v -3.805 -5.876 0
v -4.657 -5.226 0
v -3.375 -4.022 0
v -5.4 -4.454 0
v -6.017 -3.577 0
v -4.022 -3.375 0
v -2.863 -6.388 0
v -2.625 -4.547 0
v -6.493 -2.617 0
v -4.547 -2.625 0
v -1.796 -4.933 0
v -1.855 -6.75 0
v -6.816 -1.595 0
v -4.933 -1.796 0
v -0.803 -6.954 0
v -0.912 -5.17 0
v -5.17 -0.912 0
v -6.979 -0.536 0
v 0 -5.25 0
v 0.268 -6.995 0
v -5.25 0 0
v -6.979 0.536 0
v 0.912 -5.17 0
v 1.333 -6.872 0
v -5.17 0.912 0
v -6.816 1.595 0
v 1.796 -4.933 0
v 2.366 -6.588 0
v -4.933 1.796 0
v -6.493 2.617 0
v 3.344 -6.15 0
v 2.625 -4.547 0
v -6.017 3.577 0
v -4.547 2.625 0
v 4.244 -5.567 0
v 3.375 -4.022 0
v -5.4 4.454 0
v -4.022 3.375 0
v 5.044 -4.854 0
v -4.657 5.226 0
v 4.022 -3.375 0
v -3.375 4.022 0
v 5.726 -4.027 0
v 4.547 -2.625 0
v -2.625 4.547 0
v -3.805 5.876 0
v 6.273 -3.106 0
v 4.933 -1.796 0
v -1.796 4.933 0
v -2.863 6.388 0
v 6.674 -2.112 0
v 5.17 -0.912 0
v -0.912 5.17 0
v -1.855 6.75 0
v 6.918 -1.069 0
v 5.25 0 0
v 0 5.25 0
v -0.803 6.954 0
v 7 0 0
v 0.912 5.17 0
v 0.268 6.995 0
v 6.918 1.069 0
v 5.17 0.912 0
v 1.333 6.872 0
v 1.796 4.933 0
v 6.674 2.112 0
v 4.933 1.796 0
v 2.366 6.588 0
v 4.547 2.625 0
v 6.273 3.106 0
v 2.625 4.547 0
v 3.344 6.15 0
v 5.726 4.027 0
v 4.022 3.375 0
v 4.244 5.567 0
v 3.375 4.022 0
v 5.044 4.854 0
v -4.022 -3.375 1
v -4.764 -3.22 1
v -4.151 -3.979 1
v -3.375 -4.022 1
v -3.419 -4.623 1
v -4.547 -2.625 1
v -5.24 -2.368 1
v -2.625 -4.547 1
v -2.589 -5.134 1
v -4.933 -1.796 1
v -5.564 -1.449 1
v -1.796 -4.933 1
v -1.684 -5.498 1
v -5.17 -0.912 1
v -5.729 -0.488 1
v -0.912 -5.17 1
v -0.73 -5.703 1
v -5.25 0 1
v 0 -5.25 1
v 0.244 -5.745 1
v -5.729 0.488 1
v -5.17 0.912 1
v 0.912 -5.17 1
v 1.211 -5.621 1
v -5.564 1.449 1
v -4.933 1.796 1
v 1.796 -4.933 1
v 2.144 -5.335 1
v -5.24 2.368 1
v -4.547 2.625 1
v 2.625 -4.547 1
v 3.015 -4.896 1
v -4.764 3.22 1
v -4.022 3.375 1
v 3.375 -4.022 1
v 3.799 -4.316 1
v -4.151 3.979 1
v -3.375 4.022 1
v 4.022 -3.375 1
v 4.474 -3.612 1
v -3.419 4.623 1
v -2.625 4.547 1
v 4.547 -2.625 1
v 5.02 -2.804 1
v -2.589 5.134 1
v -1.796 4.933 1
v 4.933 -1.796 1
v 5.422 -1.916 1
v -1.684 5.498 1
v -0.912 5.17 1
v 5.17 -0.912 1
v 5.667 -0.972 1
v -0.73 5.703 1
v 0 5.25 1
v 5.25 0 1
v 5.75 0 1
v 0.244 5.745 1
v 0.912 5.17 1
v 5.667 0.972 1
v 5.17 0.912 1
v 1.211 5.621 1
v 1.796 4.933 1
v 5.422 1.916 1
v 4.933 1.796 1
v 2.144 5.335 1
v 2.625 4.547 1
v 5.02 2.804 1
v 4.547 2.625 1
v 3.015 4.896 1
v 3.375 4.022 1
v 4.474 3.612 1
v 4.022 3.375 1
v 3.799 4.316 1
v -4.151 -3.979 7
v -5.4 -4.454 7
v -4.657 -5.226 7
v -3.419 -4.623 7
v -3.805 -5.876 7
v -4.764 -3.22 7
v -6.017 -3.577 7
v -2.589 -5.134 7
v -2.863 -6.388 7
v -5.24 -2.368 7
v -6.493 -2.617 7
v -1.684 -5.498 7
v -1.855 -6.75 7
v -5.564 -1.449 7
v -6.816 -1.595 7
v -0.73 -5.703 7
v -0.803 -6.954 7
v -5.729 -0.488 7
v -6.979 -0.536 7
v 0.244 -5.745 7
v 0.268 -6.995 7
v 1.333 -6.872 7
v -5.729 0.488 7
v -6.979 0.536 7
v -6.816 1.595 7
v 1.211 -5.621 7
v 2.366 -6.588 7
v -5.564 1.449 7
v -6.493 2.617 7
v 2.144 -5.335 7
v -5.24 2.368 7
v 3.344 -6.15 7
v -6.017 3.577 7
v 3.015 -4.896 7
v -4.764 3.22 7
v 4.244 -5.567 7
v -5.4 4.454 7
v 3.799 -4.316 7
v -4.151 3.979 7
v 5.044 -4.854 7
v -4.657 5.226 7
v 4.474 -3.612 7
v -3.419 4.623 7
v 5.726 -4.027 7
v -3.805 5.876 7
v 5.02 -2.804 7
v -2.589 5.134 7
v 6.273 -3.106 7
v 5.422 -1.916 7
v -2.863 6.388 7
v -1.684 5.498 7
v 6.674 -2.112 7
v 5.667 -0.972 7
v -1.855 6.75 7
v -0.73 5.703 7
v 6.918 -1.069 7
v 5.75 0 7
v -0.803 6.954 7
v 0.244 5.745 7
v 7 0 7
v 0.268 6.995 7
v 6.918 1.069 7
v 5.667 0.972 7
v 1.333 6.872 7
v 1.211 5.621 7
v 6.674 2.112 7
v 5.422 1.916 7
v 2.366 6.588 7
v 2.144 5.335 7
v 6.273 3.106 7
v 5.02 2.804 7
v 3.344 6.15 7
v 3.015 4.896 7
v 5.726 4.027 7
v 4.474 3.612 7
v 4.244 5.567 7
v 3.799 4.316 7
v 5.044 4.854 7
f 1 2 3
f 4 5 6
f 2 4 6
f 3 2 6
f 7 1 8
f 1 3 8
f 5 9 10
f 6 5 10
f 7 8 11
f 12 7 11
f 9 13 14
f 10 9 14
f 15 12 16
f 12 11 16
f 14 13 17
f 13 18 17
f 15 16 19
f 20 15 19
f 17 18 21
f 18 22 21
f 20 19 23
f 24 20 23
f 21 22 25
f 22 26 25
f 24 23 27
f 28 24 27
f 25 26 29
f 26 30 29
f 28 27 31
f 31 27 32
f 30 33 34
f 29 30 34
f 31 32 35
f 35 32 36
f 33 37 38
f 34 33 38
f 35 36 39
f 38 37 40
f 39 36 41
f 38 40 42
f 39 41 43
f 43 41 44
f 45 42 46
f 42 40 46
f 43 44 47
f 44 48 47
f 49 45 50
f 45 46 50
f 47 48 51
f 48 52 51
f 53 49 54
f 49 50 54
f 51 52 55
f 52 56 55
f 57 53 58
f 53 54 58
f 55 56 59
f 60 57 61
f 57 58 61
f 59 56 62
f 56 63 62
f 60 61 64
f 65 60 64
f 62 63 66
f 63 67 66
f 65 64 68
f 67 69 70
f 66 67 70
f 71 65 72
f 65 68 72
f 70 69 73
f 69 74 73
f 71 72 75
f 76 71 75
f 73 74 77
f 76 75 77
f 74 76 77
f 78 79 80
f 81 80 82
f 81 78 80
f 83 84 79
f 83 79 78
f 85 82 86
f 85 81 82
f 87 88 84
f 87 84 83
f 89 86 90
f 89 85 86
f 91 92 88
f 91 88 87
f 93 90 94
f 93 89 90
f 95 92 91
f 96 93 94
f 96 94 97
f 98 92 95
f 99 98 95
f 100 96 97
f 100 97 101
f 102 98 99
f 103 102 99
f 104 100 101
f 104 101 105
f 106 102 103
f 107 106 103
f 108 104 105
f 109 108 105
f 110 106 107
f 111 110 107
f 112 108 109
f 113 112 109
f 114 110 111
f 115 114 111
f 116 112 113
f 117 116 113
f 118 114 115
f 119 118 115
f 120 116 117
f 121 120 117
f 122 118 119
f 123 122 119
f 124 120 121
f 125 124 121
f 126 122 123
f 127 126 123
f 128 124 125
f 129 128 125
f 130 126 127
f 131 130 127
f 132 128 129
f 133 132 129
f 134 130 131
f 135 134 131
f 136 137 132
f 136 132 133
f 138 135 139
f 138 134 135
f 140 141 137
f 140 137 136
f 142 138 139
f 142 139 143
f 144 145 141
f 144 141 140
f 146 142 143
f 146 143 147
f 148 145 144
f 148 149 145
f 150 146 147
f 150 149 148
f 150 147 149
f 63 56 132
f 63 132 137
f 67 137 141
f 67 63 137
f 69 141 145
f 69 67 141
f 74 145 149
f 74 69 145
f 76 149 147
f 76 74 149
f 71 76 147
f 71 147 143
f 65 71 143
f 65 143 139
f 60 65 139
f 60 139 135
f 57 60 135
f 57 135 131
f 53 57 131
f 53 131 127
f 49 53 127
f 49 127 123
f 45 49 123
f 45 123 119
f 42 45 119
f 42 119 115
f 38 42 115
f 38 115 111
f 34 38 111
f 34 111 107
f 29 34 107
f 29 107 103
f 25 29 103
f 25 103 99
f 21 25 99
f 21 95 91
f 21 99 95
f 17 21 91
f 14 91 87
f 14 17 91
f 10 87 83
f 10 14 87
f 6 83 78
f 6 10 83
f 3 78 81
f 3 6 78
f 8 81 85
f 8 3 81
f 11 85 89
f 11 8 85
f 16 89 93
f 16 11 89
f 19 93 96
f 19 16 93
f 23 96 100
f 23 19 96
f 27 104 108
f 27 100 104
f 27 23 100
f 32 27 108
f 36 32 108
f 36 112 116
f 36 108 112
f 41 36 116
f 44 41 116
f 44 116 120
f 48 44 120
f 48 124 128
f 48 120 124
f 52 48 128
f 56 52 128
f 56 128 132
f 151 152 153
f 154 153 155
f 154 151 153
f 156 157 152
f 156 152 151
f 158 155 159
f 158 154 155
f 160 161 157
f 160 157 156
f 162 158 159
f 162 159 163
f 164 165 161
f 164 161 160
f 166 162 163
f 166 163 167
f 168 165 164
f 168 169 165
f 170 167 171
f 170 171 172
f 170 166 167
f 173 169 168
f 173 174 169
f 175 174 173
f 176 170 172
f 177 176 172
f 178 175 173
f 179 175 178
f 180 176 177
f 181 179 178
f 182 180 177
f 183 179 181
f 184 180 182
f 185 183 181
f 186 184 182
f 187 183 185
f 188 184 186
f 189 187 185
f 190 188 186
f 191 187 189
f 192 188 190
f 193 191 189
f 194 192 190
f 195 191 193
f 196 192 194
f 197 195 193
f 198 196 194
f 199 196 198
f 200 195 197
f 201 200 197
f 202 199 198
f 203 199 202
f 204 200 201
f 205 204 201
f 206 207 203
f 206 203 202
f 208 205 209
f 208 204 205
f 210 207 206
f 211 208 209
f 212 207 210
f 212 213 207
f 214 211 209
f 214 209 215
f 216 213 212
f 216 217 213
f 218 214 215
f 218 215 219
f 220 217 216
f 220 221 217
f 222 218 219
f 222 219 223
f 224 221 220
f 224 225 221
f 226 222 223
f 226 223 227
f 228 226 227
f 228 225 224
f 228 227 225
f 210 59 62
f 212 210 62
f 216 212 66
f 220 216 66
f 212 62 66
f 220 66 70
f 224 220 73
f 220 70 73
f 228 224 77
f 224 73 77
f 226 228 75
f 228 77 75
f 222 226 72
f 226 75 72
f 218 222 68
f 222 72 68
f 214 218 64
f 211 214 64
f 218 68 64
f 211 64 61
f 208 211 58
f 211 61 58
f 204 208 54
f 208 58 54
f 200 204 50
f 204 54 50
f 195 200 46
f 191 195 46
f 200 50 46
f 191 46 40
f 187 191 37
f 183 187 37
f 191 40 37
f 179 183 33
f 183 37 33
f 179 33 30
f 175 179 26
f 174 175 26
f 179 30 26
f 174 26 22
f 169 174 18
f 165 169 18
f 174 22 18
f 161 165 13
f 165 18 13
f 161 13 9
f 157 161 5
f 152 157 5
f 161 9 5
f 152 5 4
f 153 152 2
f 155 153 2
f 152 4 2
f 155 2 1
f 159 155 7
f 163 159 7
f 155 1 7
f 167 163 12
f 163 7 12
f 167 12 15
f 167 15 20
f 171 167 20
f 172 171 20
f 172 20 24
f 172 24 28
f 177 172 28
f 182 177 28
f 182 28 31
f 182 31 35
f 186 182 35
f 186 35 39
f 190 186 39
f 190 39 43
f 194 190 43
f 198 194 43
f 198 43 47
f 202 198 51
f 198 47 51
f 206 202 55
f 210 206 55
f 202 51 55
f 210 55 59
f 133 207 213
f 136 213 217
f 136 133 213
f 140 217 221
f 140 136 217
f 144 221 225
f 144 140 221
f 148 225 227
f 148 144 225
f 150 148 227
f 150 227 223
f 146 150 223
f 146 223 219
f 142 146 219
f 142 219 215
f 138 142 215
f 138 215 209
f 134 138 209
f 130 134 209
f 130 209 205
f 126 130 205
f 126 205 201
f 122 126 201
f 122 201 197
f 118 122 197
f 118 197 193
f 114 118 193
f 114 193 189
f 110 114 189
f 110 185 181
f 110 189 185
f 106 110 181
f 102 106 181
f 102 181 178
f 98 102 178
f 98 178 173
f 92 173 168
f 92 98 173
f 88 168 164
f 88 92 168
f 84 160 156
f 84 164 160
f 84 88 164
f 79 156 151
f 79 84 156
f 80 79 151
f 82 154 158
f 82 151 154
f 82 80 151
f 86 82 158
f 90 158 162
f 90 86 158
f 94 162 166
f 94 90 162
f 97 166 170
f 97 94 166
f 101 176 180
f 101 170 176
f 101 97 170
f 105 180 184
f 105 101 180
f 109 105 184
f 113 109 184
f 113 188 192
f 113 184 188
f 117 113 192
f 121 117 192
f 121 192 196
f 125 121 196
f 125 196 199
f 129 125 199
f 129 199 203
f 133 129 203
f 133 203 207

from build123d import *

# Parameters (mm, degrees)
CYLINDER005_R     = 5.25
CYLINDER005_DEPTH = 10
CYLINDER003_R     = 5.75
CYLINDER003_DEPTH = 10
CYLINDER004_R     = 7
CYLINDER004_DEPTH = 7


with BuildPart() as holderlenssmall:
    # Cylinder005 → Cylinder005 (new body)
    with BuildSketch(Plane.XY):
        Circle(CYLINDER005_R)
    extrude(amount=CYLINDER005_DEPTH)


with BuildPart() as holderlens:
    # Cylinder003 → Cylinder003 (new body)
    with BuildSketch(Plane.XY.offset(1)):
        Circle(CYLINDER003_R)
    extrude(amount=CYLINDER003_DEPTH)


with BuildPart() as lensholder01:
    # Cylinder004 → Cylinder004 (new body)
    with BuildSketch(Plane.XY):
        Circle(CYLINDER004_R)
    extrude(amount=CYLINDER004_DEPTH)

    # Cut003: cut HolderLens
    add(holderlens.part, mode=Mode.SUBTRACT)

    # Cut004: cut HolderLensSmall
    add(holderlenssmall.part, mode=Mode.SUBTRACT)


solid = lensholder01.part
